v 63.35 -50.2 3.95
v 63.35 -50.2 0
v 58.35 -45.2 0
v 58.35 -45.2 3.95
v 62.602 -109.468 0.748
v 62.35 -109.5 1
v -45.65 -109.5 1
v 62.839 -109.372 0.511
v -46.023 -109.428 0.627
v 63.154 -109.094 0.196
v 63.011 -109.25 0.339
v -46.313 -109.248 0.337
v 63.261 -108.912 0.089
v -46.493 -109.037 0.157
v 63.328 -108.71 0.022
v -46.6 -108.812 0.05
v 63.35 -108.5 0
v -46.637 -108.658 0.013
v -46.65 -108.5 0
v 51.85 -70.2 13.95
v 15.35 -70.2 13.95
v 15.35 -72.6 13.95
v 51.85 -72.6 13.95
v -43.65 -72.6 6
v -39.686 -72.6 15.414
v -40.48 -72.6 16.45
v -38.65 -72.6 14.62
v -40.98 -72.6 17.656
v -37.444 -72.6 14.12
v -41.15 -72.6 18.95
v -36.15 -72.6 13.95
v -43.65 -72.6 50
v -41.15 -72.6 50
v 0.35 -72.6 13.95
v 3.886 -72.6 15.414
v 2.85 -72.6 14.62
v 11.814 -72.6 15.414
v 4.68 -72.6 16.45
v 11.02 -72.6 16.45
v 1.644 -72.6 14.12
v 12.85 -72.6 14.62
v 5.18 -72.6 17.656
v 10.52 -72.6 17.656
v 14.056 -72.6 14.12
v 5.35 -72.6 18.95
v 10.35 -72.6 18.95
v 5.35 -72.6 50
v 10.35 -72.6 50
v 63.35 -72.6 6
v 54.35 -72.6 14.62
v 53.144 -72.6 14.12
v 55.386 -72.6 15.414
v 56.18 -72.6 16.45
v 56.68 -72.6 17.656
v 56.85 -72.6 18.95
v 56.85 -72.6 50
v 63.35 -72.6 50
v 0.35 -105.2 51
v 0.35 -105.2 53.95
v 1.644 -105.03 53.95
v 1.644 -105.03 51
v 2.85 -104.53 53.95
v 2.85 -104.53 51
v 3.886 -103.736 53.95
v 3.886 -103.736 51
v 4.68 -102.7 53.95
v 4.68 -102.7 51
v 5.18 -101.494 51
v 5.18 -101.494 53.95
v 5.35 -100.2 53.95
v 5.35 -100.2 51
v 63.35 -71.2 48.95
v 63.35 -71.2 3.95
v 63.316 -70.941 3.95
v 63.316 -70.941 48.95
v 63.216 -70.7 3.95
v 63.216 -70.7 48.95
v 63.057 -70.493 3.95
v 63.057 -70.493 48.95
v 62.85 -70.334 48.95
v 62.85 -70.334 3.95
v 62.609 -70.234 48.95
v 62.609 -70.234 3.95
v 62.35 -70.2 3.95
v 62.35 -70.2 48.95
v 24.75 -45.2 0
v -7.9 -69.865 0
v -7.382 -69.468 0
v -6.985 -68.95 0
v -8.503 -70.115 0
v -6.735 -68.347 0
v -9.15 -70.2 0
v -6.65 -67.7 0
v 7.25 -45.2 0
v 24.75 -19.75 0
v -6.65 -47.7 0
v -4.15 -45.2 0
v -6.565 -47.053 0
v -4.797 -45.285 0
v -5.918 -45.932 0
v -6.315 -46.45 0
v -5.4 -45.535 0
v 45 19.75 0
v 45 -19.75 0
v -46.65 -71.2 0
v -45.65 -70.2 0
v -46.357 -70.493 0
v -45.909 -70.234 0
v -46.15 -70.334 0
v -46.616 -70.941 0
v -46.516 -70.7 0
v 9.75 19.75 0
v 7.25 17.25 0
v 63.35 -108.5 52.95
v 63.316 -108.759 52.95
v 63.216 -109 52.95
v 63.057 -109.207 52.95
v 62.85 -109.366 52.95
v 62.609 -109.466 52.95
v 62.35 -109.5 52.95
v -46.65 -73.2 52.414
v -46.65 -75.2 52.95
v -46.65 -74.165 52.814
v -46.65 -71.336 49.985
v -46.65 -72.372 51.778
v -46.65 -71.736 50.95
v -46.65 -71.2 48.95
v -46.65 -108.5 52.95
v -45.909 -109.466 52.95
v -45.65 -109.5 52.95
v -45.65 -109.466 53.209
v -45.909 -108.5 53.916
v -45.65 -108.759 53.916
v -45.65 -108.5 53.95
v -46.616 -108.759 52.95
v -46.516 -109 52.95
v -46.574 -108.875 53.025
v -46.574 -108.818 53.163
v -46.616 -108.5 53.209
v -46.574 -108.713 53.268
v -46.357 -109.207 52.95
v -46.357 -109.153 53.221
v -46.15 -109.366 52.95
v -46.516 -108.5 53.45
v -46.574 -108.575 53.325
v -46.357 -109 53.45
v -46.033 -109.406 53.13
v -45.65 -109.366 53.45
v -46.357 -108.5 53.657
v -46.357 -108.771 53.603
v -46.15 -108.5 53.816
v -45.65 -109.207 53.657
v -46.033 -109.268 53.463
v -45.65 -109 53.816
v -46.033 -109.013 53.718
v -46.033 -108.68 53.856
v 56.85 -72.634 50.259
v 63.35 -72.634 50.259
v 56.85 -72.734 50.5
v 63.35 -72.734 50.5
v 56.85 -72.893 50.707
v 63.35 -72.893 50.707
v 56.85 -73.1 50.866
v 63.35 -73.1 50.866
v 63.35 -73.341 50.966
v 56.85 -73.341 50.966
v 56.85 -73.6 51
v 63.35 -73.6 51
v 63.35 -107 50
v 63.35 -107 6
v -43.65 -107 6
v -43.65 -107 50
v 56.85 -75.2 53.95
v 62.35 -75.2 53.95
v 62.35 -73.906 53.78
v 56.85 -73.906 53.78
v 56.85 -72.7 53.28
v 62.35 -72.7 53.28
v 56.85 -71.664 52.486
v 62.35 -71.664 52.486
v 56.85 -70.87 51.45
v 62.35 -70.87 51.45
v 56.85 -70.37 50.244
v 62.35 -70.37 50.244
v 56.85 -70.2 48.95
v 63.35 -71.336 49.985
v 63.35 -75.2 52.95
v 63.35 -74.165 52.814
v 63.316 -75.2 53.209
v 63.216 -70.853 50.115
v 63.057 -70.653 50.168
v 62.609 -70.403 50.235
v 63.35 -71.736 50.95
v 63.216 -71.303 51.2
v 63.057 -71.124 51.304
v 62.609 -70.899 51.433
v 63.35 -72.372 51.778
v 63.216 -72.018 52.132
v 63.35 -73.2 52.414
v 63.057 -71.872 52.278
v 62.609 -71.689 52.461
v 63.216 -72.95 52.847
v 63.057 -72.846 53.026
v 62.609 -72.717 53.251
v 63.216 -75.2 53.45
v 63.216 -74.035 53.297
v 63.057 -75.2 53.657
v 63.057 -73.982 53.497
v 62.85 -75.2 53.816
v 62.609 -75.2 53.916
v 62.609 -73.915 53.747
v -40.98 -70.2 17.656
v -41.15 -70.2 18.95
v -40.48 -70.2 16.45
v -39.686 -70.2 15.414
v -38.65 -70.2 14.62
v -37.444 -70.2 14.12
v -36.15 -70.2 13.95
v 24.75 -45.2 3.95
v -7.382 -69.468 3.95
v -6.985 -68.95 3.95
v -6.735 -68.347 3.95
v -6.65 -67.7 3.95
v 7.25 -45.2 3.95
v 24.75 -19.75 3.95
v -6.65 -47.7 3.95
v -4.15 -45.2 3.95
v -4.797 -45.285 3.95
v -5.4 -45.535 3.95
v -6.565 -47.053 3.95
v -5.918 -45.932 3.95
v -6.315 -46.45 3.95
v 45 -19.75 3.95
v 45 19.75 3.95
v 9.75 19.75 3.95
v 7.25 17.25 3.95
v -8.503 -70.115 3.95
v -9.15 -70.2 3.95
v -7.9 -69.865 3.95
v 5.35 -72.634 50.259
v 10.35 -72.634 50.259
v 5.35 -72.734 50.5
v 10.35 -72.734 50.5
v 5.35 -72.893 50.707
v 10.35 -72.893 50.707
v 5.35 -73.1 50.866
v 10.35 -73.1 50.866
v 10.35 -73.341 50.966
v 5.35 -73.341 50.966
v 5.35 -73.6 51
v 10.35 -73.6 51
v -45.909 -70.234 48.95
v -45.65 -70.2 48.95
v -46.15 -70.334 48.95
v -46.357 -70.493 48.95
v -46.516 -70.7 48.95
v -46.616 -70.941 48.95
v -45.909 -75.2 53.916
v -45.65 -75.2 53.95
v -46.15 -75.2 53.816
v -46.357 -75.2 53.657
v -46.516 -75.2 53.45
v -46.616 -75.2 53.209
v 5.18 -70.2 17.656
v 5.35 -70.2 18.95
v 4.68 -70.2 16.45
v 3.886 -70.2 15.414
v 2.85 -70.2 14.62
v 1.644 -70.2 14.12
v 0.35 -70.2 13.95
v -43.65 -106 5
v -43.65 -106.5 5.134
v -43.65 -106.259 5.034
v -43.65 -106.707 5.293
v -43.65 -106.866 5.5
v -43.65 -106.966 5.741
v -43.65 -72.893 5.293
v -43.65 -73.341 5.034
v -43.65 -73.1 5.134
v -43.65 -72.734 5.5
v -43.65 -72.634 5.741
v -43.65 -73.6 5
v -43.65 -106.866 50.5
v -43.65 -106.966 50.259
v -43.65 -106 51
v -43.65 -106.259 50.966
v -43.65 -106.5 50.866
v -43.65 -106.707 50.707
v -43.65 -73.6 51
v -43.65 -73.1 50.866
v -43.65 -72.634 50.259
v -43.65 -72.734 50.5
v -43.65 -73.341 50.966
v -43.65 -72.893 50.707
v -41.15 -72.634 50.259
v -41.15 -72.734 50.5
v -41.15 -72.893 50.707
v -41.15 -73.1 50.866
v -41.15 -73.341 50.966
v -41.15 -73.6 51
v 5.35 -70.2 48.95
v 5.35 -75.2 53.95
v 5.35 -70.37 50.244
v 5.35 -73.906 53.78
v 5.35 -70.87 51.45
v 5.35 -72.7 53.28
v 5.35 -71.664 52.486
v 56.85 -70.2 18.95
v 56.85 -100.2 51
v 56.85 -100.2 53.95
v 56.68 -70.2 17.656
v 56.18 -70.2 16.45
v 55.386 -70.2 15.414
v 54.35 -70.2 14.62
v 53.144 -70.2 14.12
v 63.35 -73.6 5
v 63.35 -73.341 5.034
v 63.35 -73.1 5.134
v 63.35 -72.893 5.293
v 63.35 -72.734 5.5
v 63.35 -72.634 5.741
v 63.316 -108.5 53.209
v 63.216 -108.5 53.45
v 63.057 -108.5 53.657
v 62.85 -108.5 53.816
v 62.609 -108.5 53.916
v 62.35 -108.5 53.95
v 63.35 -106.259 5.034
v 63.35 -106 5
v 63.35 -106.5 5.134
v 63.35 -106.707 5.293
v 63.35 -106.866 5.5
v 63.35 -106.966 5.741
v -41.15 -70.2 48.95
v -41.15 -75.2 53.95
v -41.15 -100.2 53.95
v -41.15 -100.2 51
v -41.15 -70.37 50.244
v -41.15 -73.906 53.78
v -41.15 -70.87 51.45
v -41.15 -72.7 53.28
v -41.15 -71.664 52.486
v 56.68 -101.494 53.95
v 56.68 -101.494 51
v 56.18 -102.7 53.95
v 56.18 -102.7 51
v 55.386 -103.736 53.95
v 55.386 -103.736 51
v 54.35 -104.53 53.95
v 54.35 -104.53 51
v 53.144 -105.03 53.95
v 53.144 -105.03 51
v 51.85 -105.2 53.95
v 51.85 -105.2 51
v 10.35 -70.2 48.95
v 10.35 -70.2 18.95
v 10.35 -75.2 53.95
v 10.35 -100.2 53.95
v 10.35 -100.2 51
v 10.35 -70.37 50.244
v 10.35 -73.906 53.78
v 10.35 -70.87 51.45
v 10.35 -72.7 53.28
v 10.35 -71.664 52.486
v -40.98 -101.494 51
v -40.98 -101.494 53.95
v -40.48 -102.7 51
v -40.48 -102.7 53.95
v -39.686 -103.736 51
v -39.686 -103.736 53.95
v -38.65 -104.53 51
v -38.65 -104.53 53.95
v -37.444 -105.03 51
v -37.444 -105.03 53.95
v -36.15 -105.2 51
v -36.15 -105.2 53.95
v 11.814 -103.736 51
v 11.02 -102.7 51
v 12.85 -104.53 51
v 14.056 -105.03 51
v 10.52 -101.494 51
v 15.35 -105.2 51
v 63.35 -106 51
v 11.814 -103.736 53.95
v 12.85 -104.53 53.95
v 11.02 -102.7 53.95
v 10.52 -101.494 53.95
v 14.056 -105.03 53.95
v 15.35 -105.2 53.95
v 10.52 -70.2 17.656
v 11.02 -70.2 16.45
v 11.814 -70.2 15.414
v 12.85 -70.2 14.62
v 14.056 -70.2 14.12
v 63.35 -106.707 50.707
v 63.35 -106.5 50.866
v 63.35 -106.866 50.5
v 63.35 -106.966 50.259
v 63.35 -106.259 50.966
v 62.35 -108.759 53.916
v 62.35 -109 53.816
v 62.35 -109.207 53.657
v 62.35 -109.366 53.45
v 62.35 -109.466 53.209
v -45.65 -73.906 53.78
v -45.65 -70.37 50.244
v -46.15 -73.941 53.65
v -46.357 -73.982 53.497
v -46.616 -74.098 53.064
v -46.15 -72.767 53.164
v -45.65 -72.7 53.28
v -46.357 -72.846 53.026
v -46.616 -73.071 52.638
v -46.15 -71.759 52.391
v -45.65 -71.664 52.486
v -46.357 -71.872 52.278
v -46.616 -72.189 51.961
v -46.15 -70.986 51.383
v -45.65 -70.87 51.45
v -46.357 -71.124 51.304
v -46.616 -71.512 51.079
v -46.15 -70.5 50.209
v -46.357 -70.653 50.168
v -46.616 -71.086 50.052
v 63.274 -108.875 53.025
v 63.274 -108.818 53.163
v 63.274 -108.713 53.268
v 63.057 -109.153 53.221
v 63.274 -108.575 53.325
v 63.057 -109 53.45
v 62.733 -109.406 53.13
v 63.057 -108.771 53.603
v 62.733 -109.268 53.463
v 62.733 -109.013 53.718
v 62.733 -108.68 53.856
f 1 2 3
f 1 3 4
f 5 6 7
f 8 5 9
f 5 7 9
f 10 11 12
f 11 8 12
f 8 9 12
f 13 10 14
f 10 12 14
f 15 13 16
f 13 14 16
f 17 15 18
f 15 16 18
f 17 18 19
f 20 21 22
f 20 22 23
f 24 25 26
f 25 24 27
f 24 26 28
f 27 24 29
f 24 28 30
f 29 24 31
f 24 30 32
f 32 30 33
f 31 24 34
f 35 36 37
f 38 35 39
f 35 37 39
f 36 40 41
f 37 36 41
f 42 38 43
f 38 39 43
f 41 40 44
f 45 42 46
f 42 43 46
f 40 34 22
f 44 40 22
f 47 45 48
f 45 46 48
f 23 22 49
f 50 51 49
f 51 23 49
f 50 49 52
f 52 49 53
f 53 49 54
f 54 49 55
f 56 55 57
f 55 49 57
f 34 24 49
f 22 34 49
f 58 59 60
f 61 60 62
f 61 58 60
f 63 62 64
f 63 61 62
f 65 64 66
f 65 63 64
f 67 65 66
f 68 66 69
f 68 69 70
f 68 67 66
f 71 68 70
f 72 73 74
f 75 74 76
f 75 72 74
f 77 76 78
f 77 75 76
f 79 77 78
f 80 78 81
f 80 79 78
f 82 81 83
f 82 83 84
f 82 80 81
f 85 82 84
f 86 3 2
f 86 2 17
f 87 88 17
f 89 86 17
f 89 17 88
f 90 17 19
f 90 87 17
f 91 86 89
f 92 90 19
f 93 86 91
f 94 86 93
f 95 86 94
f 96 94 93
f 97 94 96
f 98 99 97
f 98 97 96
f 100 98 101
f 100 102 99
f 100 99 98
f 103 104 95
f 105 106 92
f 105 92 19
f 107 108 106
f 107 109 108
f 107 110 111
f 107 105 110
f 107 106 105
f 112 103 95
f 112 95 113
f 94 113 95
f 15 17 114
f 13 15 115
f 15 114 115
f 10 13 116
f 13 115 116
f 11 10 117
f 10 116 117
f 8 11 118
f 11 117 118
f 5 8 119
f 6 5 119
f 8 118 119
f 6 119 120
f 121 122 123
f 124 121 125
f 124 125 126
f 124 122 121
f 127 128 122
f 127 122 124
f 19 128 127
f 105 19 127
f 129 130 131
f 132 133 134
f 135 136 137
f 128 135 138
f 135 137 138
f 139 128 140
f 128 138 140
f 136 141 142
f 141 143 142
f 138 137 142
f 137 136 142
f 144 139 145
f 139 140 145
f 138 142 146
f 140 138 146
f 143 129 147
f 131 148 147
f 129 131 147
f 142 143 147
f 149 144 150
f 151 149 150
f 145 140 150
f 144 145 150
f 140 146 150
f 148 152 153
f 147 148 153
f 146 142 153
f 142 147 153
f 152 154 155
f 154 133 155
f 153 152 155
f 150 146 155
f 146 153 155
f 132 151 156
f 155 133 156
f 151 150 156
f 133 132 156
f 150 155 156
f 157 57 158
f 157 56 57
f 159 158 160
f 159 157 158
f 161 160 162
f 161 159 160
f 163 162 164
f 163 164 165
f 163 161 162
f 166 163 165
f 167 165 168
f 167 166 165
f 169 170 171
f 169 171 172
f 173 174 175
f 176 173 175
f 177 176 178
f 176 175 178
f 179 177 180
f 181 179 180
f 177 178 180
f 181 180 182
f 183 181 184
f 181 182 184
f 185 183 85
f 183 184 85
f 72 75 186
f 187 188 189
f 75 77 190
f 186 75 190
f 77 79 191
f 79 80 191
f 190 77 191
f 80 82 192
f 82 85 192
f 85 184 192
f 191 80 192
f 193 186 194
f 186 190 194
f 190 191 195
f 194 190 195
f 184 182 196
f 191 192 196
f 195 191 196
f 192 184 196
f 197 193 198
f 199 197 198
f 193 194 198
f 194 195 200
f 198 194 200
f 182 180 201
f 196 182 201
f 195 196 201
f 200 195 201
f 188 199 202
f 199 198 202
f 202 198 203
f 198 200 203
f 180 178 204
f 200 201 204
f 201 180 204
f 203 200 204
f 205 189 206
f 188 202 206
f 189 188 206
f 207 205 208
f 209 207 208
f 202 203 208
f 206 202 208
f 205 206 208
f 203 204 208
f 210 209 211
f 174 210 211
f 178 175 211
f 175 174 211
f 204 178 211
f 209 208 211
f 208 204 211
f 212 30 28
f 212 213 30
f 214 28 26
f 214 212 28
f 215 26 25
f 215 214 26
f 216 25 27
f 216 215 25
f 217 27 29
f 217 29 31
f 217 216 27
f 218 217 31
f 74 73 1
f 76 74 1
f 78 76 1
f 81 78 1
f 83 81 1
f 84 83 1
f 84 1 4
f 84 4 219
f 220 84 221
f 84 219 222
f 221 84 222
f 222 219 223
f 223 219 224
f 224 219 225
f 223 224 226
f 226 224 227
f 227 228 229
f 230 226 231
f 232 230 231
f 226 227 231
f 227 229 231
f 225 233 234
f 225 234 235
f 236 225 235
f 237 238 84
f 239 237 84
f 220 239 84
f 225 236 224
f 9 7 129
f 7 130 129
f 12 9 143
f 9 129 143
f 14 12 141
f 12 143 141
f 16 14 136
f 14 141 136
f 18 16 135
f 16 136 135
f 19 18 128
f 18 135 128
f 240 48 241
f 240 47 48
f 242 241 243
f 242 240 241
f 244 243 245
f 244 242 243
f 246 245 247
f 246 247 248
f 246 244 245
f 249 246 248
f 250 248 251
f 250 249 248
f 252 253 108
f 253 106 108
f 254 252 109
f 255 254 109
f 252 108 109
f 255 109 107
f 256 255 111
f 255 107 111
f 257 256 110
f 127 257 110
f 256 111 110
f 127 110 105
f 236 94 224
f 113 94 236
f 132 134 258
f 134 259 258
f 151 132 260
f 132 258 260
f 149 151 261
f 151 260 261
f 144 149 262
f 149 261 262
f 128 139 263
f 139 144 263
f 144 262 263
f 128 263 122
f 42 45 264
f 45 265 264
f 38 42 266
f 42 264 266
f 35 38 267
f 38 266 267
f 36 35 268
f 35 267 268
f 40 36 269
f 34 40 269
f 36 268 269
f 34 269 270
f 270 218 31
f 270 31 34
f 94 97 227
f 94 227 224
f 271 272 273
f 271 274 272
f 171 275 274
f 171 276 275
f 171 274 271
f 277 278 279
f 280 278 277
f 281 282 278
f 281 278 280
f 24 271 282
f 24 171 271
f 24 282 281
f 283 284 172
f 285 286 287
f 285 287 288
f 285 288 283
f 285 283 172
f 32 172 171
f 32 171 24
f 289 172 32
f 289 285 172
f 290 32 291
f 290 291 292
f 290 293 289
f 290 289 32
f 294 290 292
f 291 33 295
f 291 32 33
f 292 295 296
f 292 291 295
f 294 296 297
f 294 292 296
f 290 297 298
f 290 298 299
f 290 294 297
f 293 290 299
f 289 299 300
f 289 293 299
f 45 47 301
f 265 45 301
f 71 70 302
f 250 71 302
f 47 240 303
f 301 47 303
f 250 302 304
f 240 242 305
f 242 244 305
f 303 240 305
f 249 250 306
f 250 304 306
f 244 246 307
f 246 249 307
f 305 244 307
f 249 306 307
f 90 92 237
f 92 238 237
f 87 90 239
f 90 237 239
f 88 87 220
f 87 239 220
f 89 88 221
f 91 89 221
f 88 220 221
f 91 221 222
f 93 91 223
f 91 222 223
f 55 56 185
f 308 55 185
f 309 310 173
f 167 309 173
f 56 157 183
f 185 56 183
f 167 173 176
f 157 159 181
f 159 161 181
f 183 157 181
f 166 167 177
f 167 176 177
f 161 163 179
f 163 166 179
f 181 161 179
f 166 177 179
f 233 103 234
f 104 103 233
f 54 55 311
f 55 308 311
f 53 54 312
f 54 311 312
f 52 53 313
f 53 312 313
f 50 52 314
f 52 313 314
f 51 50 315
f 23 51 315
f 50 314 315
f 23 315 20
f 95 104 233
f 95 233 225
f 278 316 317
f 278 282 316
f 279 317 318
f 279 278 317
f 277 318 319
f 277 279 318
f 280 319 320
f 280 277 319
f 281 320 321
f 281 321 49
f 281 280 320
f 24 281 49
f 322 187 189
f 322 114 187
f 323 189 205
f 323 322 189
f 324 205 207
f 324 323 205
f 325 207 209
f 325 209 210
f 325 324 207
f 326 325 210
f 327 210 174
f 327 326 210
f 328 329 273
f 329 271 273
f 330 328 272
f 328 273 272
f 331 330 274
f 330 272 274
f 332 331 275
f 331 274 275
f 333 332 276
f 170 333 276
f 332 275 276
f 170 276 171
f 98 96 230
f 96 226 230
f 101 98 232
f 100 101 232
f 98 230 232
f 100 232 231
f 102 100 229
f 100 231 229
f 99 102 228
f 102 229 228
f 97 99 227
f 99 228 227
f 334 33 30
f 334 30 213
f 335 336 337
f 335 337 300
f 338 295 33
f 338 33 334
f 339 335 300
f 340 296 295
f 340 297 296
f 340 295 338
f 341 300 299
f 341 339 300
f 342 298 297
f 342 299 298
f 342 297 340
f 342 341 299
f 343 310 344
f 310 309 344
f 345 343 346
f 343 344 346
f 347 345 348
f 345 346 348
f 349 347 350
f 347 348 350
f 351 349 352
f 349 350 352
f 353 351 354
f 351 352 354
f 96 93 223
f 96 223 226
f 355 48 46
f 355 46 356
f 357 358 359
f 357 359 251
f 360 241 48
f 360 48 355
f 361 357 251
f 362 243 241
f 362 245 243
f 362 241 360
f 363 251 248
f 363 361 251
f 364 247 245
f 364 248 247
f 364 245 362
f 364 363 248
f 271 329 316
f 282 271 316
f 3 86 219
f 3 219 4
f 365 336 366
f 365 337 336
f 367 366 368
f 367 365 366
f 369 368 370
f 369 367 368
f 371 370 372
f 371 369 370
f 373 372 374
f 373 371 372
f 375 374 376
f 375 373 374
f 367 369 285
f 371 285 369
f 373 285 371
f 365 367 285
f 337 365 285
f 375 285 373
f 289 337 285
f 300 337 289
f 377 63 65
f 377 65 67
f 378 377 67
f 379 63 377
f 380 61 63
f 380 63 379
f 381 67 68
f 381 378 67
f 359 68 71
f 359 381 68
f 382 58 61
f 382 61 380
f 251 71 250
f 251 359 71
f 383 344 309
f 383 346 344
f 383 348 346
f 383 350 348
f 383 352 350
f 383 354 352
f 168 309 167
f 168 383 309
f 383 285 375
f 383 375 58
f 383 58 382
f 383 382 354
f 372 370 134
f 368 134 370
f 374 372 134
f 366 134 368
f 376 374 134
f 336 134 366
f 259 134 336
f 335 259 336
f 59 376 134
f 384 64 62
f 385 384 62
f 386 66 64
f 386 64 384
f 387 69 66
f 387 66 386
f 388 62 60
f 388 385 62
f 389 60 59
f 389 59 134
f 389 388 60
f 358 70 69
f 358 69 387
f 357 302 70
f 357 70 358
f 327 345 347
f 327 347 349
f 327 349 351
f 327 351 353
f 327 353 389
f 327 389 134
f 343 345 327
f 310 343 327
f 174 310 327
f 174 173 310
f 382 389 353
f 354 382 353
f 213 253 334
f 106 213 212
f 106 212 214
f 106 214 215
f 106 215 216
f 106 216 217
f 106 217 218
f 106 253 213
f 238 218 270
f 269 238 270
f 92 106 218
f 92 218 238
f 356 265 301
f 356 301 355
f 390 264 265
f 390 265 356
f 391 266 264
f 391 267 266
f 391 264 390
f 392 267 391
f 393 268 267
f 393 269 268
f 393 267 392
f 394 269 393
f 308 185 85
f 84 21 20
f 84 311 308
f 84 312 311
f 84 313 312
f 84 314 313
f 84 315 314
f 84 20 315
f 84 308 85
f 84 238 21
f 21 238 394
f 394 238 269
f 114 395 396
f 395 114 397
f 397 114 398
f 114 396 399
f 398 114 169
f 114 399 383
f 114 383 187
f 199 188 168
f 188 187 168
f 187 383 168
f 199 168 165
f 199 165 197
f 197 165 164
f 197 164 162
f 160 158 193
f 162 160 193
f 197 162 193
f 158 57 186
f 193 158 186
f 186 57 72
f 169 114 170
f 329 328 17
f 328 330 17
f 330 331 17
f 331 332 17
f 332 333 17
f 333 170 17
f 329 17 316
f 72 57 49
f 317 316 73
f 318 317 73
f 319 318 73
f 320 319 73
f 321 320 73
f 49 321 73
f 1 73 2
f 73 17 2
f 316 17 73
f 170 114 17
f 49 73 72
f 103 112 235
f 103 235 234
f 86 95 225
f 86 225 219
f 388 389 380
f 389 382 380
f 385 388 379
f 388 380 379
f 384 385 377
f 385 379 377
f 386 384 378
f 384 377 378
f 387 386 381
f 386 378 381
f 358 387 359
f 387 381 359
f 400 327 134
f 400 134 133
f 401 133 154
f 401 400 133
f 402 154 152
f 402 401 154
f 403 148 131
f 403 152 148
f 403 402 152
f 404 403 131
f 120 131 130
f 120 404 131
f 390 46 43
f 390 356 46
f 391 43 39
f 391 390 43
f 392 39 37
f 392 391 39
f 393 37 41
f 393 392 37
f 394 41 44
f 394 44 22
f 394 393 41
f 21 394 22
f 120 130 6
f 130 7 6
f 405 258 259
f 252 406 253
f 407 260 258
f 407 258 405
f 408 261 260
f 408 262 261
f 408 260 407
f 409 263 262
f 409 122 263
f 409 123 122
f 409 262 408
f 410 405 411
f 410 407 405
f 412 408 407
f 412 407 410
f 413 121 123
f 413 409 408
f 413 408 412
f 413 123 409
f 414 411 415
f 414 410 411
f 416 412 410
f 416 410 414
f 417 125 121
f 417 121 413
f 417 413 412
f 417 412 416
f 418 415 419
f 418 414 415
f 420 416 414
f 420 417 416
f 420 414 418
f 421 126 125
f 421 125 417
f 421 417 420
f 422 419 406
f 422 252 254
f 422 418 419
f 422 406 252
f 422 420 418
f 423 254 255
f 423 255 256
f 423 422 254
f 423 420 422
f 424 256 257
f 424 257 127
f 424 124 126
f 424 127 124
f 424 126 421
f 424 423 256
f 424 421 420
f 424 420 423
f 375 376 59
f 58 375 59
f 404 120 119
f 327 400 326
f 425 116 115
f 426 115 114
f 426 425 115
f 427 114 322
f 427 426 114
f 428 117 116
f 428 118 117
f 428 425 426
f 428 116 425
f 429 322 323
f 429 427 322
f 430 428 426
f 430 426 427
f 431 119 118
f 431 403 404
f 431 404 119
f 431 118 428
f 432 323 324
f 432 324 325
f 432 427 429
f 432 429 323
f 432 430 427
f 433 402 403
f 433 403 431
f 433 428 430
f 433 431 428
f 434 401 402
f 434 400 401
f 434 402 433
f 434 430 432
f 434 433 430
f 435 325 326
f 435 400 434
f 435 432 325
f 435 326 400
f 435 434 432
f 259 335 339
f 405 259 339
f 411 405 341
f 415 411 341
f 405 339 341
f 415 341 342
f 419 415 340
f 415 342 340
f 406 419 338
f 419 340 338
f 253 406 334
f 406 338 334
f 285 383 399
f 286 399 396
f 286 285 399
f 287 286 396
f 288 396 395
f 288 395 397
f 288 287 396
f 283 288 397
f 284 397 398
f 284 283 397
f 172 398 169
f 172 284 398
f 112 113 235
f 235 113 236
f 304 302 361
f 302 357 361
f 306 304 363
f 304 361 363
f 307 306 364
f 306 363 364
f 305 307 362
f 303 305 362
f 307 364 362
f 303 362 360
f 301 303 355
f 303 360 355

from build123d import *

# Parameters (mm, degrees)
PAD_DEPTH       = 3.95
SKETCH001_W     = 110
SKETCH001_H     = 39.3
PAD001_DEPTH    = 50
SKETCH002_W     = 34.4
SKETCH002_H     = 46
POCKET_DEPTH    = 107
SKETCH003_W     = 46.5
SKETCH003_H     = 35
POCKET001_DEPTH = 40
CHAMFER_SIZE    = 2.5
CHAMFER001_SIZE = 5
FILLET_R        = 2.5
FILLET001_R     = 1
FILLET002_R     = 5
FILLET003_R     = 1


with BuildPart() as part:
    # Sketch → Pad (new body)
    with BuildSketch(Plane.XY):
        Polygon((7.25, 19.75), (45, 19.75), (45, -19.75), (24.75, -19.75), (24.75, -45.2), (63.35, -45.2), (63.35, -109.5), (-46.65, -109.5), (-46.65, -70.2), (-6.65, -70.2), (-6.65, -45.2), (7.25, -45.2), align=None)
    extrude(amount=PAD_DEPTH)

    # Sketch001 (on Face14 of Pad) → Pad001 (join)
    with BuildSketch(Plane.XY.offset(3.95)):
        with Locations((8.35, -89.85)):
            Rectangle(SKETCH001_W, SKETCH001_H)
    extrude(amount=PAD001_DEPTH)

    # Sketch002 (on Face15 of Pad001) → Pocket (cut)
    with BuildSketch(Plane.YZ.offset(63.35)):
        with Locations((-89.8, 28)):
            Rectangle(SKETCH002_W, SKETCH002_H)
    extrude(amount=-POCKET_DEPTH, mode=Mode.SUBTRACT)

    # Sketch003 (on Face1 of Pocket) → Pocket001 (cut)
    with BuildSketch(Plane.XY.offset(53.95)):
        with Locations((-17.9, -87.7)):
            Rectangle(SKETCH003_W, SKETCH003_H)
        with Locations((33.6, -87.7)):
            Rectangle(SKETCH003_W, SKETCH003_H)
    extrude(amount=-POCKET001_DEPTH, mode=Mode.SUBTRACT)

    # Chamfer
    chamfer_edges = [part.edges().sort_by_distance(p)[0] for p in [
        (7.25, 19.75, 1.975),
    ]]
    chamfer(chamfer_edges, length=CHAMFER_SIZE)

    # Chamfer001
    chamfer001_edges = [part.edges().sort_by_distance(p)[0] for p in [
        (63.35, -45.2, 1.975),
    ]]
    chamfer(chamfer001_edges, length=CHAMFER001_SIZE)

    # Fillet
    fillet_edges = [part.edges().sort_by_distance(p)[0] for p in [
        (-6.65, -45.2, 1.975),
        (-6.65, -70.2, 1.975),
    ]]
    fillet(fillet_edges, radius=FILLET_R)

    # Fillet001
    fillet001_edges = [part.edges().sort_by_distance(p)[0] for p in [
        (9.85, -107, 51),
        (9.85, -107, 5),
        (9.85, -72.6, 5),
        (60.1, -72.6, 51),
        (7.85, -72.6, 51),
        (-42.4, -72.6, 51),
    ]]
    fillet(fillet001_edges, radius=FILLET001_R)

    # Fillet002
    fillet002_edges = [part.edges().sort_by_distance(p)[0] for p in [
        (-41.15, -105.2, 52.475),
        (5.35, -105.2, 52.475),
        (10.35, -105.2, 52.475),
        (56.85, -105.2, 52.475),
        (-41.15, -71.4, 13.95),
        (5.35, -71.4, 13.95),
        (10.35, -71.4, 13.95),
        (56.85, -71.4, 13.95),
        (-43.9, -70.2, 53.95),
        (7.85, -70.2, 53.95),
        (60.1, -70.2, 53.95),
    ]]
    fillet(fillet002_edges, radius=FILLET002_R)

    # Fillet003
    fillet003_edges = [part.edges().sort_by_distance(p)[0] for p in [
        (8.35, -109.5, 53.95),
        (-46.65, -109.5, 26.975),
        (63.35, -109.5, 26.975),
        (-46.65, -92.35, 53.95),
        (-46.65, -71.664466, 52.485534),
        (-46.65, -70.2, 24.475),
        (63.35, -70.2, 26.45),
        (63.35, -71.664466, 52.485534),
        (63.35, -92.35, 53.95),
        (8.35, -109.5, 0),
    ]]
    fillet(fillet003_edges, radius=FILLET003_R)


solid = part.part
